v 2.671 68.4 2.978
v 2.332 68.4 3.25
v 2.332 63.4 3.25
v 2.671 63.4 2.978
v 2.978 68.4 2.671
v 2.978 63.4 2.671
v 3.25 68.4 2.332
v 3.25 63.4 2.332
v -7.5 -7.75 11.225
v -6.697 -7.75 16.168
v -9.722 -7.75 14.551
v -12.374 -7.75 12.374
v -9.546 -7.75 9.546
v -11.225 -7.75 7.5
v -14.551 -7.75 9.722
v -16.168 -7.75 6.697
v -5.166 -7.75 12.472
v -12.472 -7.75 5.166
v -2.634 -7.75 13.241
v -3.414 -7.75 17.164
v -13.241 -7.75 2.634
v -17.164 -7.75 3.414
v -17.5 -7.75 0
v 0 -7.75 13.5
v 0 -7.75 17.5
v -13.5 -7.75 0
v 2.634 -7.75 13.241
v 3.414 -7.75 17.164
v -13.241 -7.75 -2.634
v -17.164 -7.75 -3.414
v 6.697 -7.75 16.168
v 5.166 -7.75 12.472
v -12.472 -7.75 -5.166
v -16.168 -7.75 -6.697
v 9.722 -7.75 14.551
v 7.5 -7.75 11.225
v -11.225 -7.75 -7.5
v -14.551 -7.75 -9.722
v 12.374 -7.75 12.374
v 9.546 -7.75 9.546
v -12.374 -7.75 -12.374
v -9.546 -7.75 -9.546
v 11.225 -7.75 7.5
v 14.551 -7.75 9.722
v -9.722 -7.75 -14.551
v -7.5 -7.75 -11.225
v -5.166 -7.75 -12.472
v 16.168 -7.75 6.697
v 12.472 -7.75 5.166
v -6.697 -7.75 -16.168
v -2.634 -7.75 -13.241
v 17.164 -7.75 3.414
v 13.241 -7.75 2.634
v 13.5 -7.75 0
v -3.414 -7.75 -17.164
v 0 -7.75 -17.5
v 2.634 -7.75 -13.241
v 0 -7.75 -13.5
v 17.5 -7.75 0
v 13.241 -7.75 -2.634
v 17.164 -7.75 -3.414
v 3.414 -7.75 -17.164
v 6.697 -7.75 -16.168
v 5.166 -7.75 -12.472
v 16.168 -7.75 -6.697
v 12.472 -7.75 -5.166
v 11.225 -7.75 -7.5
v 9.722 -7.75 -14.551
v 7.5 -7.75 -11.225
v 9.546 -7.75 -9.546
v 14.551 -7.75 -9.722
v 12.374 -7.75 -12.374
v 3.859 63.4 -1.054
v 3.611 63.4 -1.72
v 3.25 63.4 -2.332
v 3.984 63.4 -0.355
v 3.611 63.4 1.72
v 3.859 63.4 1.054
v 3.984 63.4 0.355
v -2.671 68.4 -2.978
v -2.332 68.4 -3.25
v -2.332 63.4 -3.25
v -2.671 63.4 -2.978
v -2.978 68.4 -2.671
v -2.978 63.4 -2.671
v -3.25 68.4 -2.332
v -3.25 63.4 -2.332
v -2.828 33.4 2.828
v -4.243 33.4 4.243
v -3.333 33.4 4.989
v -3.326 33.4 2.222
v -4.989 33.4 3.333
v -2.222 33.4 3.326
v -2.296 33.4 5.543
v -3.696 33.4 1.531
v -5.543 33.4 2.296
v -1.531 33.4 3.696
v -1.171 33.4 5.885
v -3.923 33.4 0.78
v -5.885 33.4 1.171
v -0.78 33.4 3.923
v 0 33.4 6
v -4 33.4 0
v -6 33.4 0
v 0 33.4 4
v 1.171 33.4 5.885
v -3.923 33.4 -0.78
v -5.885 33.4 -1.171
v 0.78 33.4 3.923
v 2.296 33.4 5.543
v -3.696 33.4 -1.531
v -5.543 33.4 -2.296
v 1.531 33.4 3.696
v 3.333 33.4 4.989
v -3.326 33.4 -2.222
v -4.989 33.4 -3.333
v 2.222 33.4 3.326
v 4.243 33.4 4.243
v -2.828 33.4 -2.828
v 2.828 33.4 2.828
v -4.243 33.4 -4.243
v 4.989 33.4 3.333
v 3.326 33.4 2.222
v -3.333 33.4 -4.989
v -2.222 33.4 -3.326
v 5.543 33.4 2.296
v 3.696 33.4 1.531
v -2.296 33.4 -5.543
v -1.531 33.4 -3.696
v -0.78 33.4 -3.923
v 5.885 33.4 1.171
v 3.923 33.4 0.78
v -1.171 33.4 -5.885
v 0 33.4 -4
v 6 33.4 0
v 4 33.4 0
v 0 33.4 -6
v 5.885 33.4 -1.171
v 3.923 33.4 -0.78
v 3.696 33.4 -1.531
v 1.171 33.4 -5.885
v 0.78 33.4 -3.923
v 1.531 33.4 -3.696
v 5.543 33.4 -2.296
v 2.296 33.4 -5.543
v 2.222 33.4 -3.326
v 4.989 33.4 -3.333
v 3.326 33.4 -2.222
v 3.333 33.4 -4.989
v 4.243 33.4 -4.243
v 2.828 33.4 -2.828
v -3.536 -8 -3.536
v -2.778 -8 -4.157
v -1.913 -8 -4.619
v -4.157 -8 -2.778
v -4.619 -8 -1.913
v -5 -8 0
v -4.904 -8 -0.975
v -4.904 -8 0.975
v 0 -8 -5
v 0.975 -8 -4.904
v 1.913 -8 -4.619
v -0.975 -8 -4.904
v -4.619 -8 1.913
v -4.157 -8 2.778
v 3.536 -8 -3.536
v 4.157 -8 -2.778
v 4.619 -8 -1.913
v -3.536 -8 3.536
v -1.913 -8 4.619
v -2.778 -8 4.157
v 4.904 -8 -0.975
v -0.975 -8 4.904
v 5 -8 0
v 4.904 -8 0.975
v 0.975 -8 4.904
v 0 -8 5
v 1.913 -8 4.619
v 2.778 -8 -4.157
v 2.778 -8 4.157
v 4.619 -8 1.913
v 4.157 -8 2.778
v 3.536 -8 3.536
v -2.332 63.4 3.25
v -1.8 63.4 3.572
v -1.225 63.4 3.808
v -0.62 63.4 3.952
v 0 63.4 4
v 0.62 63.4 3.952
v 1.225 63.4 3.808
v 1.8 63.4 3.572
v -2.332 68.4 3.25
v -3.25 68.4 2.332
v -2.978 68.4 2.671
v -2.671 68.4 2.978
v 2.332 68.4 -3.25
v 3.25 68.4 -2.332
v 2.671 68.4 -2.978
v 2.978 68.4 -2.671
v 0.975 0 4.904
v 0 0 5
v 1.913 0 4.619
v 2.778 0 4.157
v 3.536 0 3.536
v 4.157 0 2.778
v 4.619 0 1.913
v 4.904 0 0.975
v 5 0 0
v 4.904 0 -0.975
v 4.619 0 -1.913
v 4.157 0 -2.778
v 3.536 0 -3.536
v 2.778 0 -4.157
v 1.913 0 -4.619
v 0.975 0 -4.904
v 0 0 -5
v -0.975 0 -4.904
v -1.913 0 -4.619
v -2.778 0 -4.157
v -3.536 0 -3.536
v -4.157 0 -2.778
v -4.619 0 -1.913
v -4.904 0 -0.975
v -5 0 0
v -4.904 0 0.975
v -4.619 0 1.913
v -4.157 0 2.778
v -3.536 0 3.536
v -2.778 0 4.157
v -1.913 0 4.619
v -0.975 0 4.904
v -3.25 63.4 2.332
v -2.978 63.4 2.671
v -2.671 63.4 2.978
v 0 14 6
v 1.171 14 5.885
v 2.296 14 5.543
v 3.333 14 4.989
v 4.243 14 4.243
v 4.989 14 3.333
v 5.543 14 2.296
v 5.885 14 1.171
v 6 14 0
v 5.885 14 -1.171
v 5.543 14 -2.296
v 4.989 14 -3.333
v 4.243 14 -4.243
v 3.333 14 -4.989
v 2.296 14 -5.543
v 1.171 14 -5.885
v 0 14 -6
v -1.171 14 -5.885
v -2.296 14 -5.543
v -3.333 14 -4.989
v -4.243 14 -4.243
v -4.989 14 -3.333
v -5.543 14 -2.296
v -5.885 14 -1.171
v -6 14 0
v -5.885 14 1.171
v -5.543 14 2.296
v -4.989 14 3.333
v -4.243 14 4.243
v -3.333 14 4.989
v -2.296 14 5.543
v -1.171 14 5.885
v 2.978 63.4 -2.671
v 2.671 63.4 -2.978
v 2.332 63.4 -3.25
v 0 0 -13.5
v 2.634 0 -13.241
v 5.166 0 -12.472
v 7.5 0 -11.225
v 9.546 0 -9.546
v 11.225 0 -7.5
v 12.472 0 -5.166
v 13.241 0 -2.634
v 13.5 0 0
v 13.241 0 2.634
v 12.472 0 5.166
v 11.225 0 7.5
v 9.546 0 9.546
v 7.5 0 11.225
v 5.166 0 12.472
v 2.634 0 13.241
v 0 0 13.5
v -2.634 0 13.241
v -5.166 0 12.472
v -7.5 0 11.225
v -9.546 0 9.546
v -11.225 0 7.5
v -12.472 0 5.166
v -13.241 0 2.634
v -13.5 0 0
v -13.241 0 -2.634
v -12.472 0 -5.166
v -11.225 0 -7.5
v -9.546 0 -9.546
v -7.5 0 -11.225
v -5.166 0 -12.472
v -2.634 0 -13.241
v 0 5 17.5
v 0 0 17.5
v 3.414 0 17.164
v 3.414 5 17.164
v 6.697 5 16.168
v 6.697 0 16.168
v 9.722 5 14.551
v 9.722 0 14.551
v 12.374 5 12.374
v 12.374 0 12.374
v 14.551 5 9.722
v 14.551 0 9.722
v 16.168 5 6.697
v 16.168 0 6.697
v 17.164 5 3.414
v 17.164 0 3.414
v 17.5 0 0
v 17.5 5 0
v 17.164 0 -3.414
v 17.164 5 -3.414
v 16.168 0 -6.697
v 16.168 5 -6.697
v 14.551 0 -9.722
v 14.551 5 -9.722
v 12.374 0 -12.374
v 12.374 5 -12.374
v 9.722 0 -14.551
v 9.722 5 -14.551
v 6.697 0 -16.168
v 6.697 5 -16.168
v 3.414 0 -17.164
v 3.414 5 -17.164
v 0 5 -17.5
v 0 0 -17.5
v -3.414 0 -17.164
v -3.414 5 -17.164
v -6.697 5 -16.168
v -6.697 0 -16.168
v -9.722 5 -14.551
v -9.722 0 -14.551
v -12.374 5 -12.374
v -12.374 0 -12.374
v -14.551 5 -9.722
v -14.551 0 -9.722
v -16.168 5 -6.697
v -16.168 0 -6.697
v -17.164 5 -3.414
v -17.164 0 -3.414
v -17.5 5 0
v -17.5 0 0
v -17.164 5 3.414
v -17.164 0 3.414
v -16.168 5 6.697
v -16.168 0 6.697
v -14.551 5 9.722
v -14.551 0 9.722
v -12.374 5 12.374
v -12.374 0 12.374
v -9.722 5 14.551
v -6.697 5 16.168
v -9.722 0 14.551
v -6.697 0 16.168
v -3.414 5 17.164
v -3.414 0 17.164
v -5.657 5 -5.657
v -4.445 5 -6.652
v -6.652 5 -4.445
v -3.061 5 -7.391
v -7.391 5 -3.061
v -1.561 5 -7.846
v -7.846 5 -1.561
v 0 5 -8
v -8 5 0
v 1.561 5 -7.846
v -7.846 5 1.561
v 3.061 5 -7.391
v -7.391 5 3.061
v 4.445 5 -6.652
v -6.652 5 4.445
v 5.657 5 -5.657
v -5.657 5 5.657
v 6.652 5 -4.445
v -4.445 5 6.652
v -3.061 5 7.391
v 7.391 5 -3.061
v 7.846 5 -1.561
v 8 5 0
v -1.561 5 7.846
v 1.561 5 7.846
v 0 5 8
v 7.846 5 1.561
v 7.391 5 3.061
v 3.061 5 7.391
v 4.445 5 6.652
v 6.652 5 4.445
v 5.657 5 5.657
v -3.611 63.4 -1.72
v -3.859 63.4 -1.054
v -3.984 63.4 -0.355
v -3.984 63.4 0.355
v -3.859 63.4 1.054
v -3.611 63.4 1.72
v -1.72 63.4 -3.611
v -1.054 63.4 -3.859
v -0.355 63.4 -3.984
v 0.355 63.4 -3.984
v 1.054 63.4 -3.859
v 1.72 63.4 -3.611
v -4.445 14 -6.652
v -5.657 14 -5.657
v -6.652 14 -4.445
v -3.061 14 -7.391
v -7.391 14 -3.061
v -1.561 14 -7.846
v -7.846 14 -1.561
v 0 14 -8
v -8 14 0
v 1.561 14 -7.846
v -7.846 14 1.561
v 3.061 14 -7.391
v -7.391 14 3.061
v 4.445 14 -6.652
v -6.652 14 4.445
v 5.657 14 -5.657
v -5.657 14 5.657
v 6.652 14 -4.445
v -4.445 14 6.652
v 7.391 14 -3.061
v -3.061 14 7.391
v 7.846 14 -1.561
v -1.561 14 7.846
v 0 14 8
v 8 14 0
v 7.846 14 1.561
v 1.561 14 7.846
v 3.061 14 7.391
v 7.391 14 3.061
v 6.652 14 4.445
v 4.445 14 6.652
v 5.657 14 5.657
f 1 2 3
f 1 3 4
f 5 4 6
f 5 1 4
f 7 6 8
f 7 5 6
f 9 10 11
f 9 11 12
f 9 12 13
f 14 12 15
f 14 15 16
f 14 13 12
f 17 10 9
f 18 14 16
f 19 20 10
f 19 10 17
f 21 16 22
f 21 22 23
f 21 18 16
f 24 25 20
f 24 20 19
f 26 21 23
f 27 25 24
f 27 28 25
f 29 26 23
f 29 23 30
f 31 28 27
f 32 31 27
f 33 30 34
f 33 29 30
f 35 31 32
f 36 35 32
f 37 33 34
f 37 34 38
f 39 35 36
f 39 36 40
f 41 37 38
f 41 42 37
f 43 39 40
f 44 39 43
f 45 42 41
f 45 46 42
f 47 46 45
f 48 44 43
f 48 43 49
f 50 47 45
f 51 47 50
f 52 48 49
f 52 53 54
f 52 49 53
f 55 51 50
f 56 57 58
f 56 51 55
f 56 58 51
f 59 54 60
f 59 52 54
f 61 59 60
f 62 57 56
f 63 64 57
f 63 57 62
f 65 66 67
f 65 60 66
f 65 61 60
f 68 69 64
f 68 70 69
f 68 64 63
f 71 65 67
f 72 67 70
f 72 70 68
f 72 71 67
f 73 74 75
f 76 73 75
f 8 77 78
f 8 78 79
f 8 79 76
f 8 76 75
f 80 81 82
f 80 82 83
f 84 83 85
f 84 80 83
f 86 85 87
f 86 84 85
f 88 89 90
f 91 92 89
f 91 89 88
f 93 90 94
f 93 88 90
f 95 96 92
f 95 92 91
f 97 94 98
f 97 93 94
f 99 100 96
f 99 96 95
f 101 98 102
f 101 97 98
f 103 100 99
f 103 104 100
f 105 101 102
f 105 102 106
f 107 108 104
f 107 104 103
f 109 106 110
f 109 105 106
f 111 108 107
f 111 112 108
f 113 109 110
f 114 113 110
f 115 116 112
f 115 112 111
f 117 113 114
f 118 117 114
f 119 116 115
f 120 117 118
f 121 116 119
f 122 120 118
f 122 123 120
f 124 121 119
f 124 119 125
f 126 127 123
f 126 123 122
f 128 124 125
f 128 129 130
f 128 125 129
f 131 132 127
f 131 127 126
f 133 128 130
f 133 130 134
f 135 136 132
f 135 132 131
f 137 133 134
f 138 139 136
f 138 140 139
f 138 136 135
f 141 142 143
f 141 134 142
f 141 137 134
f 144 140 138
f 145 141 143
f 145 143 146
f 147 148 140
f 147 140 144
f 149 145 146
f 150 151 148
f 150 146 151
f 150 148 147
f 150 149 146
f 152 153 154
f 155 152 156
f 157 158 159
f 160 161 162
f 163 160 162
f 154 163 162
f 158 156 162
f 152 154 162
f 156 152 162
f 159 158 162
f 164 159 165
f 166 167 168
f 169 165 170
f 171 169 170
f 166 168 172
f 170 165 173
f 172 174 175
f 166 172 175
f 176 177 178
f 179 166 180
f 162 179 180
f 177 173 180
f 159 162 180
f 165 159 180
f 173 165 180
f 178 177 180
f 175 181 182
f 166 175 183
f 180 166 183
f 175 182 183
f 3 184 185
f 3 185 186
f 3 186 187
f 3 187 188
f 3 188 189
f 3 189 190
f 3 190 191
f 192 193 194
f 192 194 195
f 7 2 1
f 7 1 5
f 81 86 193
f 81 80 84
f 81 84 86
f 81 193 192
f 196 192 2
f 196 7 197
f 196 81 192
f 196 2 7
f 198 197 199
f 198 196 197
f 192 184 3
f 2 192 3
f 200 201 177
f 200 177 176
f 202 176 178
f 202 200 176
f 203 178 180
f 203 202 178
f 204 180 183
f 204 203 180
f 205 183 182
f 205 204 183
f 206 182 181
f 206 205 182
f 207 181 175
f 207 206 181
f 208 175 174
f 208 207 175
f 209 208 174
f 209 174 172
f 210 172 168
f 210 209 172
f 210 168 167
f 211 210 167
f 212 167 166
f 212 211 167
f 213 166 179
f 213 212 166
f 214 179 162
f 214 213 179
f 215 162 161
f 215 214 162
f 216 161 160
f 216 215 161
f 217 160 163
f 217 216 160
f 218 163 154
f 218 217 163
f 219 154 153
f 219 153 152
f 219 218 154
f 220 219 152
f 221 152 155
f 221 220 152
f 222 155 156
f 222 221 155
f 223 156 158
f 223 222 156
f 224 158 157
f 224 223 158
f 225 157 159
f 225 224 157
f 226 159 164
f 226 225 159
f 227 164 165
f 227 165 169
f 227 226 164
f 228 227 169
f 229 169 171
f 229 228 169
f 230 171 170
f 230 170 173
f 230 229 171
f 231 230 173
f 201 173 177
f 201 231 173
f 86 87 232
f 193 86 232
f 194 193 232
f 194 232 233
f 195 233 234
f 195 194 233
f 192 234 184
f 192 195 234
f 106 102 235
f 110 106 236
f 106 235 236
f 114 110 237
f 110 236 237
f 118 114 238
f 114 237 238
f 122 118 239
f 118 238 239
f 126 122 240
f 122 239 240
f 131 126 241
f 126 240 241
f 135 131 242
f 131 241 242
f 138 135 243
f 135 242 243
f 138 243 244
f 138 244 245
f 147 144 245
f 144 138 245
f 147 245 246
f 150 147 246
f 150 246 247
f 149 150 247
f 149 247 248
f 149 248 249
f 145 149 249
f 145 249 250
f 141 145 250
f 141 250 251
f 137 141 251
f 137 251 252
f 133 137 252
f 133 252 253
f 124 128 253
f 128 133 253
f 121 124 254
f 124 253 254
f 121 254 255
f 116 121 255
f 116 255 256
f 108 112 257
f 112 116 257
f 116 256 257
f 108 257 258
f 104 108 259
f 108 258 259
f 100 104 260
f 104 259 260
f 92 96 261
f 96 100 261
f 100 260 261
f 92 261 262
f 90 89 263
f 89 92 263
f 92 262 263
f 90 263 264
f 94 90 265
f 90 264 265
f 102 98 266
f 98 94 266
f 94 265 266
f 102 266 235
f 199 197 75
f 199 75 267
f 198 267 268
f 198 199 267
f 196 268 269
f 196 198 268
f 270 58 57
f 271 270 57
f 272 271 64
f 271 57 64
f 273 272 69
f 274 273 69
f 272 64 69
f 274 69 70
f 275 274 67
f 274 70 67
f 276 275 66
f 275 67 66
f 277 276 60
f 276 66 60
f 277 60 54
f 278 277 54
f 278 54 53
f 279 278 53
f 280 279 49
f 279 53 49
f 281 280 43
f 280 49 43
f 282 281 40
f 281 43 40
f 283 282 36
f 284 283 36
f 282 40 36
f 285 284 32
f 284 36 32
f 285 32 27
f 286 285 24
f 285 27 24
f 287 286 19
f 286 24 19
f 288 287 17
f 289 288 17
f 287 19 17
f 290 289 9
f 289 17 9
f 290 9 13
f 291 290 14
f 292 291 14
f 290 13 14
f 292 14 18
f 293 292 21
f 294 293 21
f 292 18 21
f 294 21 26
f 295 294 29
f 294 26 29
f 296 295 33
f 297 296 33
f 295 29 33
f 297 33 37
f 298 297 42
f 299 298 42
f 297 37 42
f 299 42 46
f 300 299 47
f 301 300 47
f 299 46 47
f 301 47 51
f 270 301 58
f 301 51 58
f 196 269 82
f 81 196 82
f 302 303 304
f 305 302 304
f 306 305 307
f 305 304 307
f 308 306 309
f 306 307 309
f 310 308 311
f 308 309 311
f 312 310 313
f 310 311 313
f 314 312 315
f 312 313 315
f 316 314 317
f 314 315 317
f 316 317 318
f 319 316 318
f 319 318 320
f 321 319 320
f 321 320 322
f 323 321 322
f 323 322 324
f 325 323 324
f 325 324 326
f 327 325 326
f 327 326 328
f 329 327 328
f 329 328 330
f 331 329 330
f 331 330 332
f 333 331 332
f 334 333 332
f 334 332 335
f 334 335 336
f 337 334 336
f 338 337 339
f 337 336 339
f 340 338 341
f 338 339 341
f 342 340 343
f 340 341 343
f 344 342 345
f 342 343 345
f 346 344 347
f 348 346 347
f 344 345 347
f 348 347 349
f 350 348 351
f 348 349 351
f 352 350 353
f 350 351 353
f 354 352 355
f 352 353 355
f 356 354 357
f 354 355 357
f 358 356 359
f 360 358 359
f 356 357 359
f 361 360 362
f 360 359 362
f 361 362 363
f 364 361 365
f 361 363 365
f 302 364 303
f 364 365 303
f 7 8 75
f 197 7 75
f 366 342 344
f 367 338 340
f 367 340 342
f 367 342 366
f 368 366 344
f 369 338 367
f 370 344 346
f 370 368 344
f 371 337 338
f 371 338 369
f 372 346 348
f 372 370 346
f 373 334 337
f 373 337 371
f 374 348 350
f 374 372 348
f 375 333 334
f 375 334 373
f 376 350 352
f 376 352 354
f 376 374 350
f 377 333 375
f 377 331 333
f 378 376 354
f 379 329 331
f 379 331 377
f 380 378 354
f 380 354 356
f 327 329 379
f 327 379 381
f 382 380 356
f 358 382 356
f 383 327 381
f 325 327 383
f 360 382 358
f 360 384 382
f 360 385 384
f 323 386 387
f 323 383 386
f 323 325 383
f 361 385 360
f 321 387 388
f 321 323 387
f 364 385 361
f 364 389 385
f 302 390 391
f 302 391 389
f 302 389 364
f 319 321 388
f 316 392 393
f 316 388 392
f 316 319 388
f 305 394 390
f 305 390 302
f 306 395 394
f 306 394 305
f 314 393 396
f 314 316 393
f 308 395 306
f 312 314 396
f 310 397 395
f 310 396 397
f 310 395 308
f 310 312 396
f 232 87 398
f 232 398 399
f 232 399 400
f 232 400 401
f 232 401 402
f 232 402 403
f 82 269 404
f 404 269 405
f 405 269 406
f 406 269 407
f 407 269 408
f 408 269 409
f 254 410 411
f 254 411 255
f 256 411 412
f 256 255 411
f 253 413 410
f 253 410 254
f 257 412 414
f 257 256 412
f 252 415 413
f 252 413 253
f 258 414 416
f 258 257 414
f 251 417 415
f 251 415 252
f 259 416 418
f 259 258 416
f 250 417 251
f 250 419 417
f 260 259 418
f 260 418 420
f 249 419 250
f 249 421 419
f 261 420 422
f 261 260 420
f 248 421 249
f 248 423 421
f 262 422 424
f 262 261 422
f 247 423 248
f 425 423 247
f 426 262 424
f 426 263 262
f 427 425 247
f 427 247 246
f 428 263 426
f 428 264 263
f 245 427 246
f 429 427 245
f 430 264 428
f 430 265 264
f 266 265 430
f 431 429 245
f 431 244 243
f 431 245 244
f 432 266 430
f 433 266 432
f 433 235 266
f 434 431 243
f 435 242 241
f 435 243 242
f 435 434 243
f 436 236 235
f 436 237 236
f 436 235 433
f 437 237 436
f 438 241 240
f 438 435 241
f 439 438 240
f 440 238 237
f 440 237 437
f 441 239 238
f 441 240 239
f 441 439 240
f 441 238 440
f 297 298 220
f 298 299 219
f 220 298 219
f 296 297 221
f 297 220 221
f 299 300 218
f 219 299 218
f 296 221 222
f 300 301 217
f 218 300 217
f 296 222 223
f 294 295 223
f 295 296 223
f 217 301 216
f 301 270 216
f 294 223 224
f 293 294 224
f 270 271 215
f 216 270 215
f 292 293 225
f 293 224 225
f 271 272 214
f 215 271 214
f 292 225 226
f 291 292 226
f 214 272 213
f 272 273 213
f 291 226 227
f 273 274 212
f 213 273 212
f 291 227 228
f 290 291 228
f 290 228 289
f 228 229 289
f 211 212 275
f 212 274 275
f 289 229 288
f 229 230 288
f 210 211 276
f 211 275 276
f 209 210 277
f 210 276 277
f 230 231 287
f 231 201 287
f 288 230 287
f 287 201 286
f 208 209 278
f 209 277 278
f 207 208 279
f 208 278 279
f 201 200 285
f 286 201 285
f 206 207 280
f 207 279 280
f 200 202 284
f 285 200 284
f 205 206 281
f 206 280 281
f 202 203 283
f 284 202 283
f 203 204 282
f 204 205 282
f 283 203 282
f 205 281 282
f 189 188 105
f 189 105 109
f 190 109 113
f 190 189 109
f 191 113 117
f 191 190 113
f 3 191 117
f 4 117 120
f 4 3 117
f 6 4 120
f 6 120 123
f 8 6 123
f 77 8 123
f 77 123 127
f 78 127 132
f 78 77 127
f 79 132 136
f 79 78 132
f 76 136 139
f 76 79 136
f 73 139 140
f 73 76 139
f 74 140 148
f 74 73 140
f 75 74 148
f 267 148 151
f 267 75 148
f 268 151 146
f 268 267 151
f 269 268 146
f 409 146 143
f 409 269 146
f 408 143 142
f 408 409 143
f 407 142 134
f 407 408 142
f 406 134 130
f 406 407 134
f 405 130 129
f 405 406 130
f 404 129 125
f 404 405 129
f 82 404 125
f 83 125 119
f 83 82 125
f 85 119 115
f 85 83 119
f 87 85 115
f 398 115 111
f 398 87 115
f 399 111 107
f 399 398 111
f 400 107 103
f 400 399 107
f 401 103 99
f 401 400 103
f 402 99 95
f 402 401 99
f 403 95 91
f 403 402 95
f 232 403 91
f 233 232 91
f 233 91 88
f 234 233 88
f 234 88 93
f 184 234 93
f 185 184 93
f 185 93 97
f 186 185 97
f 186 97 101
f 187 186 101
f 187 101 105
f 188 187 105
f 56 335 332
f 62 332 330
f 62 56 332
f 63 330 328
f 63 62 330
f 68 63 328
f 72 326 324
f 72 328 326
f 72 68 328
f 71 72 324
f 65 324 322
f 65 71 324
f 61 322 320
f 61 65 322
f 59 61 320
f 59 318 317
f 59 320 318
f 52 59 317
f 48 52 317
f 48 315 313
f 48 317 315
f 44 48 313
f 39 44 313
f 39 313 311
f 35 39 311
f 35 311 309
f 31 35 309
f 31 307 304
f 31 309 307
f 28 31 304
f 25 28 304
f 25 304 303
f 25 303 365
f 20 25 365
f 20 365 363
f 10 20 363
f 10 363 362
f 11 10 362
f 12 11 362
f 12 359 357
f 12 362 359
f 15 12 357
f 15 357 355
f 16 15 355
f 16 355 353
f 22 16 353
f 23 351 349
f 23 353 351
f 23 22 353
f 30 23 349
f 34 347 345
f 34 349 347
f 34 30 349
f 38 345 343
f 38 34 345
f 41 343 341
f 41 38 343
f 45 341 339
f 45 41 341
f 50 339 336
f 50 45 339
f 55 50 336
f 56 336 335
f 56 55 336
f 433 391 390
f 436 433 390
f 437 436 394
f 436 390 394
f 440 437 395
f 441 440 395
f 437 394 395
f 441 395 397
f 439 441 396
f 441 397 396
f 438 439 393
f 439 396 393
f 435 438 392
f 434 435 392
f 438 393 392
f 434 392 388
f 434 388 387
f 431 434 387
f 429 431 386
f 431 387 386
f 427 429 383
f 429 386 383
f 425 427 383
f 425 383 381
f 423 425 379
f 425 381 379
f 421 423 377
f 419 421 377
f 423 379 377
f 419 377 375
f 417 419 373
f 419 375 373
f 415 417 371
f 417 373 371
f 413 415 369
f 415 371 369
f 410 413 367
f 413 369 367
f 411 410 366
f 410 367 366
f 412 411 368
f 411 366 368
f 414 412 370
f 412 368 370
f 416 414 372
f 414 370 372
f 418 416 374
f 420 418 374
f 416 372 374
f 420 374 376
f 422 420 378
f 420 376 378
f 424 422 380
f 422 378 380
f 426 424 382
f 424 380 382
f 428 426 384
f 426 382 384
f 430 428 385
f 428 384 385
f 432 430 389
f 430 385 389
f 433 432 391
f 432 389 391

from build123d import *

# Parameters (mm, degrees)
SKETCH1_R           = 5
BOSS_EXTRUDE1_DEPTH = 8
SKETCH2_R           = 17.5
BOSS_EXTRUDE2_DEPTH = 5
BOSS_EXTRUDE3_START = 7.75
SKETCH3_R           = 17.5
SKETCH3_R_2         = 13.5
BOSS_EXTRUDE3_DEPTH = 7.75
SKETCH4_R           = 6
BOSS_EXTRUDE4_DEPTH = 58.4
SKETCH7_R           = 7.998050104
SKETCH7_R_2         = 4
CUT_EXTRUDE1_DEPTH  = 30
SKETCH8_R           = 8
SKETCH8_R_2         = 6
BOSS_EXTRUDE6_DEPTH = 9
BOSS_EXTRUDE7_START = 5
BOSS_EXTRUDE7_DEPTH = 5


with BuildPart() as part:
    # Sketch1 → Boss-Extrude1 (new body)
    with BuildSketch(Plane(origin=(0, 0, 0), x_dir=(1, 0, 0), z_dir=(0, 1, 0))):
        with Locations(Location((0, 0, 0), (0, 0, 270))):
            Circle(SKETCH1_R)
    extrude(amount=-BOSS_EXTRUDE1_DEPTH)

    # Sketch2 → Boss-Extrude2 (add)
    with BuildSketch(Plane(origin=(0, 0, 0), x_dir=(1, 0, 0), z_dir=(0, 1, 0))):
        with Locations(Location((0, 0, 0), (0, 0, 270))):
            Circle(SKETCH2_R)
    extrude(amount=BOSS_EXTRUDE2_DEPTH)

    # Sketch3 → Boss-Extrude3 (add)
    with BuildSketch(Plane.XZ.offset(BOSS_EXTRUDE3_START)):
        with Locations(Location((0, 0, 0), (0, 0, 270))):
            Circle(SKETCH3_R)
        with Locations(Location((0, 0, 0), (0, 0, 270))):
            Circle(SKETCH3_R_2, mode=Mode.SUBTRACT)
    extrude(amount=-BOSS_EXTRUDE3_DEPTH)

    # Sketch4 → Boss-Extrude4 (add)
    with BuildSketch(Plane(origin=(0, 5, 0), x_dir=(1, 0, 0), z_dir=(0, 1, 0))):
        with Locations(Location((0, 0, 0), (0, 0, 270))):
            Circle(SKETCH4_R)
    extrude(amount=BOSS_EXTRUDE4_DEPTH)

    # Sketch7 → Cut-Extrude1 (cut)
    with BuildSketch(Plane(origin=(0, 63.4, 0), x_dir=(1, 0, 0), z_dir=(0, 1, 0))):
        Circle(SKETCH7_R)
        with Locations(Location((0, 0, 0), (0, 0, 270))):
            Circle(SKETCH7_R_2, mode=Mode.SUBTRACT)
    extrude(amount=-CUT_EXTRUDE1_DEPTH, mode=Mode.SUBTRACT)

    # Sketch8 → Boss-Extrude6 (add)
    with BuildSketch(Plane(origin=(0, 5, 0), x_dir=(1, 0, 0), z_dir=(0, 1, 0))):
        with Locations(Location((0, 0, 0), (0, 0, 270))):
            Circle(SKETCH8_R)
        with Locations(Location((0, 0, 0), (0, 0, 270))):
            Circle(SKETCH8_R_2, mode=Mode.SUBTRACT)
    extrude(amount=BOSS_EXTRUDE6_DEPTH)

    # Sketch10 → Boss-Extrude7 (add)
    with BuildSketch(Plane(origin=(0, 63.4, 0), x_dir=(1, 0, 0), z_dir=(0, 1, 0)).offset(BOSS_EXTRUDE7_START)):
        with BuildLine():
            Line((-3.25, 2.331844763), (-3.25, -2.331844763))
            ThreePointArc((-3.25, -2.331844763), (-2.828427125, -2.828427125), (-2.331844763, -3.25))
            Line((-2.331844763, -3.25), (2.331844763, -3.25))
            ThreePointArc((2.331844763, -3.25), (2.828427125, -2.828427125), (3.25, -2.331844763))
            Line((3.25, -2.331844763), (3.25, 2.331844763))
            ThreePointArc((3.25, 2.331844763), (2.828427125, 2.828427125), (2.331844763, 3.25))
            Line((2.331844763, 3.25), (-2.331844763, 3.25))
            ThreePointArc((-2.331844763, 3.25), (-2.828427125, 2.828427125), (-3.25, 2.331844763))
        make_face()
    extrude(amount=-BOSS_EXTRUDE7_DEPTH)


solid = part.part
